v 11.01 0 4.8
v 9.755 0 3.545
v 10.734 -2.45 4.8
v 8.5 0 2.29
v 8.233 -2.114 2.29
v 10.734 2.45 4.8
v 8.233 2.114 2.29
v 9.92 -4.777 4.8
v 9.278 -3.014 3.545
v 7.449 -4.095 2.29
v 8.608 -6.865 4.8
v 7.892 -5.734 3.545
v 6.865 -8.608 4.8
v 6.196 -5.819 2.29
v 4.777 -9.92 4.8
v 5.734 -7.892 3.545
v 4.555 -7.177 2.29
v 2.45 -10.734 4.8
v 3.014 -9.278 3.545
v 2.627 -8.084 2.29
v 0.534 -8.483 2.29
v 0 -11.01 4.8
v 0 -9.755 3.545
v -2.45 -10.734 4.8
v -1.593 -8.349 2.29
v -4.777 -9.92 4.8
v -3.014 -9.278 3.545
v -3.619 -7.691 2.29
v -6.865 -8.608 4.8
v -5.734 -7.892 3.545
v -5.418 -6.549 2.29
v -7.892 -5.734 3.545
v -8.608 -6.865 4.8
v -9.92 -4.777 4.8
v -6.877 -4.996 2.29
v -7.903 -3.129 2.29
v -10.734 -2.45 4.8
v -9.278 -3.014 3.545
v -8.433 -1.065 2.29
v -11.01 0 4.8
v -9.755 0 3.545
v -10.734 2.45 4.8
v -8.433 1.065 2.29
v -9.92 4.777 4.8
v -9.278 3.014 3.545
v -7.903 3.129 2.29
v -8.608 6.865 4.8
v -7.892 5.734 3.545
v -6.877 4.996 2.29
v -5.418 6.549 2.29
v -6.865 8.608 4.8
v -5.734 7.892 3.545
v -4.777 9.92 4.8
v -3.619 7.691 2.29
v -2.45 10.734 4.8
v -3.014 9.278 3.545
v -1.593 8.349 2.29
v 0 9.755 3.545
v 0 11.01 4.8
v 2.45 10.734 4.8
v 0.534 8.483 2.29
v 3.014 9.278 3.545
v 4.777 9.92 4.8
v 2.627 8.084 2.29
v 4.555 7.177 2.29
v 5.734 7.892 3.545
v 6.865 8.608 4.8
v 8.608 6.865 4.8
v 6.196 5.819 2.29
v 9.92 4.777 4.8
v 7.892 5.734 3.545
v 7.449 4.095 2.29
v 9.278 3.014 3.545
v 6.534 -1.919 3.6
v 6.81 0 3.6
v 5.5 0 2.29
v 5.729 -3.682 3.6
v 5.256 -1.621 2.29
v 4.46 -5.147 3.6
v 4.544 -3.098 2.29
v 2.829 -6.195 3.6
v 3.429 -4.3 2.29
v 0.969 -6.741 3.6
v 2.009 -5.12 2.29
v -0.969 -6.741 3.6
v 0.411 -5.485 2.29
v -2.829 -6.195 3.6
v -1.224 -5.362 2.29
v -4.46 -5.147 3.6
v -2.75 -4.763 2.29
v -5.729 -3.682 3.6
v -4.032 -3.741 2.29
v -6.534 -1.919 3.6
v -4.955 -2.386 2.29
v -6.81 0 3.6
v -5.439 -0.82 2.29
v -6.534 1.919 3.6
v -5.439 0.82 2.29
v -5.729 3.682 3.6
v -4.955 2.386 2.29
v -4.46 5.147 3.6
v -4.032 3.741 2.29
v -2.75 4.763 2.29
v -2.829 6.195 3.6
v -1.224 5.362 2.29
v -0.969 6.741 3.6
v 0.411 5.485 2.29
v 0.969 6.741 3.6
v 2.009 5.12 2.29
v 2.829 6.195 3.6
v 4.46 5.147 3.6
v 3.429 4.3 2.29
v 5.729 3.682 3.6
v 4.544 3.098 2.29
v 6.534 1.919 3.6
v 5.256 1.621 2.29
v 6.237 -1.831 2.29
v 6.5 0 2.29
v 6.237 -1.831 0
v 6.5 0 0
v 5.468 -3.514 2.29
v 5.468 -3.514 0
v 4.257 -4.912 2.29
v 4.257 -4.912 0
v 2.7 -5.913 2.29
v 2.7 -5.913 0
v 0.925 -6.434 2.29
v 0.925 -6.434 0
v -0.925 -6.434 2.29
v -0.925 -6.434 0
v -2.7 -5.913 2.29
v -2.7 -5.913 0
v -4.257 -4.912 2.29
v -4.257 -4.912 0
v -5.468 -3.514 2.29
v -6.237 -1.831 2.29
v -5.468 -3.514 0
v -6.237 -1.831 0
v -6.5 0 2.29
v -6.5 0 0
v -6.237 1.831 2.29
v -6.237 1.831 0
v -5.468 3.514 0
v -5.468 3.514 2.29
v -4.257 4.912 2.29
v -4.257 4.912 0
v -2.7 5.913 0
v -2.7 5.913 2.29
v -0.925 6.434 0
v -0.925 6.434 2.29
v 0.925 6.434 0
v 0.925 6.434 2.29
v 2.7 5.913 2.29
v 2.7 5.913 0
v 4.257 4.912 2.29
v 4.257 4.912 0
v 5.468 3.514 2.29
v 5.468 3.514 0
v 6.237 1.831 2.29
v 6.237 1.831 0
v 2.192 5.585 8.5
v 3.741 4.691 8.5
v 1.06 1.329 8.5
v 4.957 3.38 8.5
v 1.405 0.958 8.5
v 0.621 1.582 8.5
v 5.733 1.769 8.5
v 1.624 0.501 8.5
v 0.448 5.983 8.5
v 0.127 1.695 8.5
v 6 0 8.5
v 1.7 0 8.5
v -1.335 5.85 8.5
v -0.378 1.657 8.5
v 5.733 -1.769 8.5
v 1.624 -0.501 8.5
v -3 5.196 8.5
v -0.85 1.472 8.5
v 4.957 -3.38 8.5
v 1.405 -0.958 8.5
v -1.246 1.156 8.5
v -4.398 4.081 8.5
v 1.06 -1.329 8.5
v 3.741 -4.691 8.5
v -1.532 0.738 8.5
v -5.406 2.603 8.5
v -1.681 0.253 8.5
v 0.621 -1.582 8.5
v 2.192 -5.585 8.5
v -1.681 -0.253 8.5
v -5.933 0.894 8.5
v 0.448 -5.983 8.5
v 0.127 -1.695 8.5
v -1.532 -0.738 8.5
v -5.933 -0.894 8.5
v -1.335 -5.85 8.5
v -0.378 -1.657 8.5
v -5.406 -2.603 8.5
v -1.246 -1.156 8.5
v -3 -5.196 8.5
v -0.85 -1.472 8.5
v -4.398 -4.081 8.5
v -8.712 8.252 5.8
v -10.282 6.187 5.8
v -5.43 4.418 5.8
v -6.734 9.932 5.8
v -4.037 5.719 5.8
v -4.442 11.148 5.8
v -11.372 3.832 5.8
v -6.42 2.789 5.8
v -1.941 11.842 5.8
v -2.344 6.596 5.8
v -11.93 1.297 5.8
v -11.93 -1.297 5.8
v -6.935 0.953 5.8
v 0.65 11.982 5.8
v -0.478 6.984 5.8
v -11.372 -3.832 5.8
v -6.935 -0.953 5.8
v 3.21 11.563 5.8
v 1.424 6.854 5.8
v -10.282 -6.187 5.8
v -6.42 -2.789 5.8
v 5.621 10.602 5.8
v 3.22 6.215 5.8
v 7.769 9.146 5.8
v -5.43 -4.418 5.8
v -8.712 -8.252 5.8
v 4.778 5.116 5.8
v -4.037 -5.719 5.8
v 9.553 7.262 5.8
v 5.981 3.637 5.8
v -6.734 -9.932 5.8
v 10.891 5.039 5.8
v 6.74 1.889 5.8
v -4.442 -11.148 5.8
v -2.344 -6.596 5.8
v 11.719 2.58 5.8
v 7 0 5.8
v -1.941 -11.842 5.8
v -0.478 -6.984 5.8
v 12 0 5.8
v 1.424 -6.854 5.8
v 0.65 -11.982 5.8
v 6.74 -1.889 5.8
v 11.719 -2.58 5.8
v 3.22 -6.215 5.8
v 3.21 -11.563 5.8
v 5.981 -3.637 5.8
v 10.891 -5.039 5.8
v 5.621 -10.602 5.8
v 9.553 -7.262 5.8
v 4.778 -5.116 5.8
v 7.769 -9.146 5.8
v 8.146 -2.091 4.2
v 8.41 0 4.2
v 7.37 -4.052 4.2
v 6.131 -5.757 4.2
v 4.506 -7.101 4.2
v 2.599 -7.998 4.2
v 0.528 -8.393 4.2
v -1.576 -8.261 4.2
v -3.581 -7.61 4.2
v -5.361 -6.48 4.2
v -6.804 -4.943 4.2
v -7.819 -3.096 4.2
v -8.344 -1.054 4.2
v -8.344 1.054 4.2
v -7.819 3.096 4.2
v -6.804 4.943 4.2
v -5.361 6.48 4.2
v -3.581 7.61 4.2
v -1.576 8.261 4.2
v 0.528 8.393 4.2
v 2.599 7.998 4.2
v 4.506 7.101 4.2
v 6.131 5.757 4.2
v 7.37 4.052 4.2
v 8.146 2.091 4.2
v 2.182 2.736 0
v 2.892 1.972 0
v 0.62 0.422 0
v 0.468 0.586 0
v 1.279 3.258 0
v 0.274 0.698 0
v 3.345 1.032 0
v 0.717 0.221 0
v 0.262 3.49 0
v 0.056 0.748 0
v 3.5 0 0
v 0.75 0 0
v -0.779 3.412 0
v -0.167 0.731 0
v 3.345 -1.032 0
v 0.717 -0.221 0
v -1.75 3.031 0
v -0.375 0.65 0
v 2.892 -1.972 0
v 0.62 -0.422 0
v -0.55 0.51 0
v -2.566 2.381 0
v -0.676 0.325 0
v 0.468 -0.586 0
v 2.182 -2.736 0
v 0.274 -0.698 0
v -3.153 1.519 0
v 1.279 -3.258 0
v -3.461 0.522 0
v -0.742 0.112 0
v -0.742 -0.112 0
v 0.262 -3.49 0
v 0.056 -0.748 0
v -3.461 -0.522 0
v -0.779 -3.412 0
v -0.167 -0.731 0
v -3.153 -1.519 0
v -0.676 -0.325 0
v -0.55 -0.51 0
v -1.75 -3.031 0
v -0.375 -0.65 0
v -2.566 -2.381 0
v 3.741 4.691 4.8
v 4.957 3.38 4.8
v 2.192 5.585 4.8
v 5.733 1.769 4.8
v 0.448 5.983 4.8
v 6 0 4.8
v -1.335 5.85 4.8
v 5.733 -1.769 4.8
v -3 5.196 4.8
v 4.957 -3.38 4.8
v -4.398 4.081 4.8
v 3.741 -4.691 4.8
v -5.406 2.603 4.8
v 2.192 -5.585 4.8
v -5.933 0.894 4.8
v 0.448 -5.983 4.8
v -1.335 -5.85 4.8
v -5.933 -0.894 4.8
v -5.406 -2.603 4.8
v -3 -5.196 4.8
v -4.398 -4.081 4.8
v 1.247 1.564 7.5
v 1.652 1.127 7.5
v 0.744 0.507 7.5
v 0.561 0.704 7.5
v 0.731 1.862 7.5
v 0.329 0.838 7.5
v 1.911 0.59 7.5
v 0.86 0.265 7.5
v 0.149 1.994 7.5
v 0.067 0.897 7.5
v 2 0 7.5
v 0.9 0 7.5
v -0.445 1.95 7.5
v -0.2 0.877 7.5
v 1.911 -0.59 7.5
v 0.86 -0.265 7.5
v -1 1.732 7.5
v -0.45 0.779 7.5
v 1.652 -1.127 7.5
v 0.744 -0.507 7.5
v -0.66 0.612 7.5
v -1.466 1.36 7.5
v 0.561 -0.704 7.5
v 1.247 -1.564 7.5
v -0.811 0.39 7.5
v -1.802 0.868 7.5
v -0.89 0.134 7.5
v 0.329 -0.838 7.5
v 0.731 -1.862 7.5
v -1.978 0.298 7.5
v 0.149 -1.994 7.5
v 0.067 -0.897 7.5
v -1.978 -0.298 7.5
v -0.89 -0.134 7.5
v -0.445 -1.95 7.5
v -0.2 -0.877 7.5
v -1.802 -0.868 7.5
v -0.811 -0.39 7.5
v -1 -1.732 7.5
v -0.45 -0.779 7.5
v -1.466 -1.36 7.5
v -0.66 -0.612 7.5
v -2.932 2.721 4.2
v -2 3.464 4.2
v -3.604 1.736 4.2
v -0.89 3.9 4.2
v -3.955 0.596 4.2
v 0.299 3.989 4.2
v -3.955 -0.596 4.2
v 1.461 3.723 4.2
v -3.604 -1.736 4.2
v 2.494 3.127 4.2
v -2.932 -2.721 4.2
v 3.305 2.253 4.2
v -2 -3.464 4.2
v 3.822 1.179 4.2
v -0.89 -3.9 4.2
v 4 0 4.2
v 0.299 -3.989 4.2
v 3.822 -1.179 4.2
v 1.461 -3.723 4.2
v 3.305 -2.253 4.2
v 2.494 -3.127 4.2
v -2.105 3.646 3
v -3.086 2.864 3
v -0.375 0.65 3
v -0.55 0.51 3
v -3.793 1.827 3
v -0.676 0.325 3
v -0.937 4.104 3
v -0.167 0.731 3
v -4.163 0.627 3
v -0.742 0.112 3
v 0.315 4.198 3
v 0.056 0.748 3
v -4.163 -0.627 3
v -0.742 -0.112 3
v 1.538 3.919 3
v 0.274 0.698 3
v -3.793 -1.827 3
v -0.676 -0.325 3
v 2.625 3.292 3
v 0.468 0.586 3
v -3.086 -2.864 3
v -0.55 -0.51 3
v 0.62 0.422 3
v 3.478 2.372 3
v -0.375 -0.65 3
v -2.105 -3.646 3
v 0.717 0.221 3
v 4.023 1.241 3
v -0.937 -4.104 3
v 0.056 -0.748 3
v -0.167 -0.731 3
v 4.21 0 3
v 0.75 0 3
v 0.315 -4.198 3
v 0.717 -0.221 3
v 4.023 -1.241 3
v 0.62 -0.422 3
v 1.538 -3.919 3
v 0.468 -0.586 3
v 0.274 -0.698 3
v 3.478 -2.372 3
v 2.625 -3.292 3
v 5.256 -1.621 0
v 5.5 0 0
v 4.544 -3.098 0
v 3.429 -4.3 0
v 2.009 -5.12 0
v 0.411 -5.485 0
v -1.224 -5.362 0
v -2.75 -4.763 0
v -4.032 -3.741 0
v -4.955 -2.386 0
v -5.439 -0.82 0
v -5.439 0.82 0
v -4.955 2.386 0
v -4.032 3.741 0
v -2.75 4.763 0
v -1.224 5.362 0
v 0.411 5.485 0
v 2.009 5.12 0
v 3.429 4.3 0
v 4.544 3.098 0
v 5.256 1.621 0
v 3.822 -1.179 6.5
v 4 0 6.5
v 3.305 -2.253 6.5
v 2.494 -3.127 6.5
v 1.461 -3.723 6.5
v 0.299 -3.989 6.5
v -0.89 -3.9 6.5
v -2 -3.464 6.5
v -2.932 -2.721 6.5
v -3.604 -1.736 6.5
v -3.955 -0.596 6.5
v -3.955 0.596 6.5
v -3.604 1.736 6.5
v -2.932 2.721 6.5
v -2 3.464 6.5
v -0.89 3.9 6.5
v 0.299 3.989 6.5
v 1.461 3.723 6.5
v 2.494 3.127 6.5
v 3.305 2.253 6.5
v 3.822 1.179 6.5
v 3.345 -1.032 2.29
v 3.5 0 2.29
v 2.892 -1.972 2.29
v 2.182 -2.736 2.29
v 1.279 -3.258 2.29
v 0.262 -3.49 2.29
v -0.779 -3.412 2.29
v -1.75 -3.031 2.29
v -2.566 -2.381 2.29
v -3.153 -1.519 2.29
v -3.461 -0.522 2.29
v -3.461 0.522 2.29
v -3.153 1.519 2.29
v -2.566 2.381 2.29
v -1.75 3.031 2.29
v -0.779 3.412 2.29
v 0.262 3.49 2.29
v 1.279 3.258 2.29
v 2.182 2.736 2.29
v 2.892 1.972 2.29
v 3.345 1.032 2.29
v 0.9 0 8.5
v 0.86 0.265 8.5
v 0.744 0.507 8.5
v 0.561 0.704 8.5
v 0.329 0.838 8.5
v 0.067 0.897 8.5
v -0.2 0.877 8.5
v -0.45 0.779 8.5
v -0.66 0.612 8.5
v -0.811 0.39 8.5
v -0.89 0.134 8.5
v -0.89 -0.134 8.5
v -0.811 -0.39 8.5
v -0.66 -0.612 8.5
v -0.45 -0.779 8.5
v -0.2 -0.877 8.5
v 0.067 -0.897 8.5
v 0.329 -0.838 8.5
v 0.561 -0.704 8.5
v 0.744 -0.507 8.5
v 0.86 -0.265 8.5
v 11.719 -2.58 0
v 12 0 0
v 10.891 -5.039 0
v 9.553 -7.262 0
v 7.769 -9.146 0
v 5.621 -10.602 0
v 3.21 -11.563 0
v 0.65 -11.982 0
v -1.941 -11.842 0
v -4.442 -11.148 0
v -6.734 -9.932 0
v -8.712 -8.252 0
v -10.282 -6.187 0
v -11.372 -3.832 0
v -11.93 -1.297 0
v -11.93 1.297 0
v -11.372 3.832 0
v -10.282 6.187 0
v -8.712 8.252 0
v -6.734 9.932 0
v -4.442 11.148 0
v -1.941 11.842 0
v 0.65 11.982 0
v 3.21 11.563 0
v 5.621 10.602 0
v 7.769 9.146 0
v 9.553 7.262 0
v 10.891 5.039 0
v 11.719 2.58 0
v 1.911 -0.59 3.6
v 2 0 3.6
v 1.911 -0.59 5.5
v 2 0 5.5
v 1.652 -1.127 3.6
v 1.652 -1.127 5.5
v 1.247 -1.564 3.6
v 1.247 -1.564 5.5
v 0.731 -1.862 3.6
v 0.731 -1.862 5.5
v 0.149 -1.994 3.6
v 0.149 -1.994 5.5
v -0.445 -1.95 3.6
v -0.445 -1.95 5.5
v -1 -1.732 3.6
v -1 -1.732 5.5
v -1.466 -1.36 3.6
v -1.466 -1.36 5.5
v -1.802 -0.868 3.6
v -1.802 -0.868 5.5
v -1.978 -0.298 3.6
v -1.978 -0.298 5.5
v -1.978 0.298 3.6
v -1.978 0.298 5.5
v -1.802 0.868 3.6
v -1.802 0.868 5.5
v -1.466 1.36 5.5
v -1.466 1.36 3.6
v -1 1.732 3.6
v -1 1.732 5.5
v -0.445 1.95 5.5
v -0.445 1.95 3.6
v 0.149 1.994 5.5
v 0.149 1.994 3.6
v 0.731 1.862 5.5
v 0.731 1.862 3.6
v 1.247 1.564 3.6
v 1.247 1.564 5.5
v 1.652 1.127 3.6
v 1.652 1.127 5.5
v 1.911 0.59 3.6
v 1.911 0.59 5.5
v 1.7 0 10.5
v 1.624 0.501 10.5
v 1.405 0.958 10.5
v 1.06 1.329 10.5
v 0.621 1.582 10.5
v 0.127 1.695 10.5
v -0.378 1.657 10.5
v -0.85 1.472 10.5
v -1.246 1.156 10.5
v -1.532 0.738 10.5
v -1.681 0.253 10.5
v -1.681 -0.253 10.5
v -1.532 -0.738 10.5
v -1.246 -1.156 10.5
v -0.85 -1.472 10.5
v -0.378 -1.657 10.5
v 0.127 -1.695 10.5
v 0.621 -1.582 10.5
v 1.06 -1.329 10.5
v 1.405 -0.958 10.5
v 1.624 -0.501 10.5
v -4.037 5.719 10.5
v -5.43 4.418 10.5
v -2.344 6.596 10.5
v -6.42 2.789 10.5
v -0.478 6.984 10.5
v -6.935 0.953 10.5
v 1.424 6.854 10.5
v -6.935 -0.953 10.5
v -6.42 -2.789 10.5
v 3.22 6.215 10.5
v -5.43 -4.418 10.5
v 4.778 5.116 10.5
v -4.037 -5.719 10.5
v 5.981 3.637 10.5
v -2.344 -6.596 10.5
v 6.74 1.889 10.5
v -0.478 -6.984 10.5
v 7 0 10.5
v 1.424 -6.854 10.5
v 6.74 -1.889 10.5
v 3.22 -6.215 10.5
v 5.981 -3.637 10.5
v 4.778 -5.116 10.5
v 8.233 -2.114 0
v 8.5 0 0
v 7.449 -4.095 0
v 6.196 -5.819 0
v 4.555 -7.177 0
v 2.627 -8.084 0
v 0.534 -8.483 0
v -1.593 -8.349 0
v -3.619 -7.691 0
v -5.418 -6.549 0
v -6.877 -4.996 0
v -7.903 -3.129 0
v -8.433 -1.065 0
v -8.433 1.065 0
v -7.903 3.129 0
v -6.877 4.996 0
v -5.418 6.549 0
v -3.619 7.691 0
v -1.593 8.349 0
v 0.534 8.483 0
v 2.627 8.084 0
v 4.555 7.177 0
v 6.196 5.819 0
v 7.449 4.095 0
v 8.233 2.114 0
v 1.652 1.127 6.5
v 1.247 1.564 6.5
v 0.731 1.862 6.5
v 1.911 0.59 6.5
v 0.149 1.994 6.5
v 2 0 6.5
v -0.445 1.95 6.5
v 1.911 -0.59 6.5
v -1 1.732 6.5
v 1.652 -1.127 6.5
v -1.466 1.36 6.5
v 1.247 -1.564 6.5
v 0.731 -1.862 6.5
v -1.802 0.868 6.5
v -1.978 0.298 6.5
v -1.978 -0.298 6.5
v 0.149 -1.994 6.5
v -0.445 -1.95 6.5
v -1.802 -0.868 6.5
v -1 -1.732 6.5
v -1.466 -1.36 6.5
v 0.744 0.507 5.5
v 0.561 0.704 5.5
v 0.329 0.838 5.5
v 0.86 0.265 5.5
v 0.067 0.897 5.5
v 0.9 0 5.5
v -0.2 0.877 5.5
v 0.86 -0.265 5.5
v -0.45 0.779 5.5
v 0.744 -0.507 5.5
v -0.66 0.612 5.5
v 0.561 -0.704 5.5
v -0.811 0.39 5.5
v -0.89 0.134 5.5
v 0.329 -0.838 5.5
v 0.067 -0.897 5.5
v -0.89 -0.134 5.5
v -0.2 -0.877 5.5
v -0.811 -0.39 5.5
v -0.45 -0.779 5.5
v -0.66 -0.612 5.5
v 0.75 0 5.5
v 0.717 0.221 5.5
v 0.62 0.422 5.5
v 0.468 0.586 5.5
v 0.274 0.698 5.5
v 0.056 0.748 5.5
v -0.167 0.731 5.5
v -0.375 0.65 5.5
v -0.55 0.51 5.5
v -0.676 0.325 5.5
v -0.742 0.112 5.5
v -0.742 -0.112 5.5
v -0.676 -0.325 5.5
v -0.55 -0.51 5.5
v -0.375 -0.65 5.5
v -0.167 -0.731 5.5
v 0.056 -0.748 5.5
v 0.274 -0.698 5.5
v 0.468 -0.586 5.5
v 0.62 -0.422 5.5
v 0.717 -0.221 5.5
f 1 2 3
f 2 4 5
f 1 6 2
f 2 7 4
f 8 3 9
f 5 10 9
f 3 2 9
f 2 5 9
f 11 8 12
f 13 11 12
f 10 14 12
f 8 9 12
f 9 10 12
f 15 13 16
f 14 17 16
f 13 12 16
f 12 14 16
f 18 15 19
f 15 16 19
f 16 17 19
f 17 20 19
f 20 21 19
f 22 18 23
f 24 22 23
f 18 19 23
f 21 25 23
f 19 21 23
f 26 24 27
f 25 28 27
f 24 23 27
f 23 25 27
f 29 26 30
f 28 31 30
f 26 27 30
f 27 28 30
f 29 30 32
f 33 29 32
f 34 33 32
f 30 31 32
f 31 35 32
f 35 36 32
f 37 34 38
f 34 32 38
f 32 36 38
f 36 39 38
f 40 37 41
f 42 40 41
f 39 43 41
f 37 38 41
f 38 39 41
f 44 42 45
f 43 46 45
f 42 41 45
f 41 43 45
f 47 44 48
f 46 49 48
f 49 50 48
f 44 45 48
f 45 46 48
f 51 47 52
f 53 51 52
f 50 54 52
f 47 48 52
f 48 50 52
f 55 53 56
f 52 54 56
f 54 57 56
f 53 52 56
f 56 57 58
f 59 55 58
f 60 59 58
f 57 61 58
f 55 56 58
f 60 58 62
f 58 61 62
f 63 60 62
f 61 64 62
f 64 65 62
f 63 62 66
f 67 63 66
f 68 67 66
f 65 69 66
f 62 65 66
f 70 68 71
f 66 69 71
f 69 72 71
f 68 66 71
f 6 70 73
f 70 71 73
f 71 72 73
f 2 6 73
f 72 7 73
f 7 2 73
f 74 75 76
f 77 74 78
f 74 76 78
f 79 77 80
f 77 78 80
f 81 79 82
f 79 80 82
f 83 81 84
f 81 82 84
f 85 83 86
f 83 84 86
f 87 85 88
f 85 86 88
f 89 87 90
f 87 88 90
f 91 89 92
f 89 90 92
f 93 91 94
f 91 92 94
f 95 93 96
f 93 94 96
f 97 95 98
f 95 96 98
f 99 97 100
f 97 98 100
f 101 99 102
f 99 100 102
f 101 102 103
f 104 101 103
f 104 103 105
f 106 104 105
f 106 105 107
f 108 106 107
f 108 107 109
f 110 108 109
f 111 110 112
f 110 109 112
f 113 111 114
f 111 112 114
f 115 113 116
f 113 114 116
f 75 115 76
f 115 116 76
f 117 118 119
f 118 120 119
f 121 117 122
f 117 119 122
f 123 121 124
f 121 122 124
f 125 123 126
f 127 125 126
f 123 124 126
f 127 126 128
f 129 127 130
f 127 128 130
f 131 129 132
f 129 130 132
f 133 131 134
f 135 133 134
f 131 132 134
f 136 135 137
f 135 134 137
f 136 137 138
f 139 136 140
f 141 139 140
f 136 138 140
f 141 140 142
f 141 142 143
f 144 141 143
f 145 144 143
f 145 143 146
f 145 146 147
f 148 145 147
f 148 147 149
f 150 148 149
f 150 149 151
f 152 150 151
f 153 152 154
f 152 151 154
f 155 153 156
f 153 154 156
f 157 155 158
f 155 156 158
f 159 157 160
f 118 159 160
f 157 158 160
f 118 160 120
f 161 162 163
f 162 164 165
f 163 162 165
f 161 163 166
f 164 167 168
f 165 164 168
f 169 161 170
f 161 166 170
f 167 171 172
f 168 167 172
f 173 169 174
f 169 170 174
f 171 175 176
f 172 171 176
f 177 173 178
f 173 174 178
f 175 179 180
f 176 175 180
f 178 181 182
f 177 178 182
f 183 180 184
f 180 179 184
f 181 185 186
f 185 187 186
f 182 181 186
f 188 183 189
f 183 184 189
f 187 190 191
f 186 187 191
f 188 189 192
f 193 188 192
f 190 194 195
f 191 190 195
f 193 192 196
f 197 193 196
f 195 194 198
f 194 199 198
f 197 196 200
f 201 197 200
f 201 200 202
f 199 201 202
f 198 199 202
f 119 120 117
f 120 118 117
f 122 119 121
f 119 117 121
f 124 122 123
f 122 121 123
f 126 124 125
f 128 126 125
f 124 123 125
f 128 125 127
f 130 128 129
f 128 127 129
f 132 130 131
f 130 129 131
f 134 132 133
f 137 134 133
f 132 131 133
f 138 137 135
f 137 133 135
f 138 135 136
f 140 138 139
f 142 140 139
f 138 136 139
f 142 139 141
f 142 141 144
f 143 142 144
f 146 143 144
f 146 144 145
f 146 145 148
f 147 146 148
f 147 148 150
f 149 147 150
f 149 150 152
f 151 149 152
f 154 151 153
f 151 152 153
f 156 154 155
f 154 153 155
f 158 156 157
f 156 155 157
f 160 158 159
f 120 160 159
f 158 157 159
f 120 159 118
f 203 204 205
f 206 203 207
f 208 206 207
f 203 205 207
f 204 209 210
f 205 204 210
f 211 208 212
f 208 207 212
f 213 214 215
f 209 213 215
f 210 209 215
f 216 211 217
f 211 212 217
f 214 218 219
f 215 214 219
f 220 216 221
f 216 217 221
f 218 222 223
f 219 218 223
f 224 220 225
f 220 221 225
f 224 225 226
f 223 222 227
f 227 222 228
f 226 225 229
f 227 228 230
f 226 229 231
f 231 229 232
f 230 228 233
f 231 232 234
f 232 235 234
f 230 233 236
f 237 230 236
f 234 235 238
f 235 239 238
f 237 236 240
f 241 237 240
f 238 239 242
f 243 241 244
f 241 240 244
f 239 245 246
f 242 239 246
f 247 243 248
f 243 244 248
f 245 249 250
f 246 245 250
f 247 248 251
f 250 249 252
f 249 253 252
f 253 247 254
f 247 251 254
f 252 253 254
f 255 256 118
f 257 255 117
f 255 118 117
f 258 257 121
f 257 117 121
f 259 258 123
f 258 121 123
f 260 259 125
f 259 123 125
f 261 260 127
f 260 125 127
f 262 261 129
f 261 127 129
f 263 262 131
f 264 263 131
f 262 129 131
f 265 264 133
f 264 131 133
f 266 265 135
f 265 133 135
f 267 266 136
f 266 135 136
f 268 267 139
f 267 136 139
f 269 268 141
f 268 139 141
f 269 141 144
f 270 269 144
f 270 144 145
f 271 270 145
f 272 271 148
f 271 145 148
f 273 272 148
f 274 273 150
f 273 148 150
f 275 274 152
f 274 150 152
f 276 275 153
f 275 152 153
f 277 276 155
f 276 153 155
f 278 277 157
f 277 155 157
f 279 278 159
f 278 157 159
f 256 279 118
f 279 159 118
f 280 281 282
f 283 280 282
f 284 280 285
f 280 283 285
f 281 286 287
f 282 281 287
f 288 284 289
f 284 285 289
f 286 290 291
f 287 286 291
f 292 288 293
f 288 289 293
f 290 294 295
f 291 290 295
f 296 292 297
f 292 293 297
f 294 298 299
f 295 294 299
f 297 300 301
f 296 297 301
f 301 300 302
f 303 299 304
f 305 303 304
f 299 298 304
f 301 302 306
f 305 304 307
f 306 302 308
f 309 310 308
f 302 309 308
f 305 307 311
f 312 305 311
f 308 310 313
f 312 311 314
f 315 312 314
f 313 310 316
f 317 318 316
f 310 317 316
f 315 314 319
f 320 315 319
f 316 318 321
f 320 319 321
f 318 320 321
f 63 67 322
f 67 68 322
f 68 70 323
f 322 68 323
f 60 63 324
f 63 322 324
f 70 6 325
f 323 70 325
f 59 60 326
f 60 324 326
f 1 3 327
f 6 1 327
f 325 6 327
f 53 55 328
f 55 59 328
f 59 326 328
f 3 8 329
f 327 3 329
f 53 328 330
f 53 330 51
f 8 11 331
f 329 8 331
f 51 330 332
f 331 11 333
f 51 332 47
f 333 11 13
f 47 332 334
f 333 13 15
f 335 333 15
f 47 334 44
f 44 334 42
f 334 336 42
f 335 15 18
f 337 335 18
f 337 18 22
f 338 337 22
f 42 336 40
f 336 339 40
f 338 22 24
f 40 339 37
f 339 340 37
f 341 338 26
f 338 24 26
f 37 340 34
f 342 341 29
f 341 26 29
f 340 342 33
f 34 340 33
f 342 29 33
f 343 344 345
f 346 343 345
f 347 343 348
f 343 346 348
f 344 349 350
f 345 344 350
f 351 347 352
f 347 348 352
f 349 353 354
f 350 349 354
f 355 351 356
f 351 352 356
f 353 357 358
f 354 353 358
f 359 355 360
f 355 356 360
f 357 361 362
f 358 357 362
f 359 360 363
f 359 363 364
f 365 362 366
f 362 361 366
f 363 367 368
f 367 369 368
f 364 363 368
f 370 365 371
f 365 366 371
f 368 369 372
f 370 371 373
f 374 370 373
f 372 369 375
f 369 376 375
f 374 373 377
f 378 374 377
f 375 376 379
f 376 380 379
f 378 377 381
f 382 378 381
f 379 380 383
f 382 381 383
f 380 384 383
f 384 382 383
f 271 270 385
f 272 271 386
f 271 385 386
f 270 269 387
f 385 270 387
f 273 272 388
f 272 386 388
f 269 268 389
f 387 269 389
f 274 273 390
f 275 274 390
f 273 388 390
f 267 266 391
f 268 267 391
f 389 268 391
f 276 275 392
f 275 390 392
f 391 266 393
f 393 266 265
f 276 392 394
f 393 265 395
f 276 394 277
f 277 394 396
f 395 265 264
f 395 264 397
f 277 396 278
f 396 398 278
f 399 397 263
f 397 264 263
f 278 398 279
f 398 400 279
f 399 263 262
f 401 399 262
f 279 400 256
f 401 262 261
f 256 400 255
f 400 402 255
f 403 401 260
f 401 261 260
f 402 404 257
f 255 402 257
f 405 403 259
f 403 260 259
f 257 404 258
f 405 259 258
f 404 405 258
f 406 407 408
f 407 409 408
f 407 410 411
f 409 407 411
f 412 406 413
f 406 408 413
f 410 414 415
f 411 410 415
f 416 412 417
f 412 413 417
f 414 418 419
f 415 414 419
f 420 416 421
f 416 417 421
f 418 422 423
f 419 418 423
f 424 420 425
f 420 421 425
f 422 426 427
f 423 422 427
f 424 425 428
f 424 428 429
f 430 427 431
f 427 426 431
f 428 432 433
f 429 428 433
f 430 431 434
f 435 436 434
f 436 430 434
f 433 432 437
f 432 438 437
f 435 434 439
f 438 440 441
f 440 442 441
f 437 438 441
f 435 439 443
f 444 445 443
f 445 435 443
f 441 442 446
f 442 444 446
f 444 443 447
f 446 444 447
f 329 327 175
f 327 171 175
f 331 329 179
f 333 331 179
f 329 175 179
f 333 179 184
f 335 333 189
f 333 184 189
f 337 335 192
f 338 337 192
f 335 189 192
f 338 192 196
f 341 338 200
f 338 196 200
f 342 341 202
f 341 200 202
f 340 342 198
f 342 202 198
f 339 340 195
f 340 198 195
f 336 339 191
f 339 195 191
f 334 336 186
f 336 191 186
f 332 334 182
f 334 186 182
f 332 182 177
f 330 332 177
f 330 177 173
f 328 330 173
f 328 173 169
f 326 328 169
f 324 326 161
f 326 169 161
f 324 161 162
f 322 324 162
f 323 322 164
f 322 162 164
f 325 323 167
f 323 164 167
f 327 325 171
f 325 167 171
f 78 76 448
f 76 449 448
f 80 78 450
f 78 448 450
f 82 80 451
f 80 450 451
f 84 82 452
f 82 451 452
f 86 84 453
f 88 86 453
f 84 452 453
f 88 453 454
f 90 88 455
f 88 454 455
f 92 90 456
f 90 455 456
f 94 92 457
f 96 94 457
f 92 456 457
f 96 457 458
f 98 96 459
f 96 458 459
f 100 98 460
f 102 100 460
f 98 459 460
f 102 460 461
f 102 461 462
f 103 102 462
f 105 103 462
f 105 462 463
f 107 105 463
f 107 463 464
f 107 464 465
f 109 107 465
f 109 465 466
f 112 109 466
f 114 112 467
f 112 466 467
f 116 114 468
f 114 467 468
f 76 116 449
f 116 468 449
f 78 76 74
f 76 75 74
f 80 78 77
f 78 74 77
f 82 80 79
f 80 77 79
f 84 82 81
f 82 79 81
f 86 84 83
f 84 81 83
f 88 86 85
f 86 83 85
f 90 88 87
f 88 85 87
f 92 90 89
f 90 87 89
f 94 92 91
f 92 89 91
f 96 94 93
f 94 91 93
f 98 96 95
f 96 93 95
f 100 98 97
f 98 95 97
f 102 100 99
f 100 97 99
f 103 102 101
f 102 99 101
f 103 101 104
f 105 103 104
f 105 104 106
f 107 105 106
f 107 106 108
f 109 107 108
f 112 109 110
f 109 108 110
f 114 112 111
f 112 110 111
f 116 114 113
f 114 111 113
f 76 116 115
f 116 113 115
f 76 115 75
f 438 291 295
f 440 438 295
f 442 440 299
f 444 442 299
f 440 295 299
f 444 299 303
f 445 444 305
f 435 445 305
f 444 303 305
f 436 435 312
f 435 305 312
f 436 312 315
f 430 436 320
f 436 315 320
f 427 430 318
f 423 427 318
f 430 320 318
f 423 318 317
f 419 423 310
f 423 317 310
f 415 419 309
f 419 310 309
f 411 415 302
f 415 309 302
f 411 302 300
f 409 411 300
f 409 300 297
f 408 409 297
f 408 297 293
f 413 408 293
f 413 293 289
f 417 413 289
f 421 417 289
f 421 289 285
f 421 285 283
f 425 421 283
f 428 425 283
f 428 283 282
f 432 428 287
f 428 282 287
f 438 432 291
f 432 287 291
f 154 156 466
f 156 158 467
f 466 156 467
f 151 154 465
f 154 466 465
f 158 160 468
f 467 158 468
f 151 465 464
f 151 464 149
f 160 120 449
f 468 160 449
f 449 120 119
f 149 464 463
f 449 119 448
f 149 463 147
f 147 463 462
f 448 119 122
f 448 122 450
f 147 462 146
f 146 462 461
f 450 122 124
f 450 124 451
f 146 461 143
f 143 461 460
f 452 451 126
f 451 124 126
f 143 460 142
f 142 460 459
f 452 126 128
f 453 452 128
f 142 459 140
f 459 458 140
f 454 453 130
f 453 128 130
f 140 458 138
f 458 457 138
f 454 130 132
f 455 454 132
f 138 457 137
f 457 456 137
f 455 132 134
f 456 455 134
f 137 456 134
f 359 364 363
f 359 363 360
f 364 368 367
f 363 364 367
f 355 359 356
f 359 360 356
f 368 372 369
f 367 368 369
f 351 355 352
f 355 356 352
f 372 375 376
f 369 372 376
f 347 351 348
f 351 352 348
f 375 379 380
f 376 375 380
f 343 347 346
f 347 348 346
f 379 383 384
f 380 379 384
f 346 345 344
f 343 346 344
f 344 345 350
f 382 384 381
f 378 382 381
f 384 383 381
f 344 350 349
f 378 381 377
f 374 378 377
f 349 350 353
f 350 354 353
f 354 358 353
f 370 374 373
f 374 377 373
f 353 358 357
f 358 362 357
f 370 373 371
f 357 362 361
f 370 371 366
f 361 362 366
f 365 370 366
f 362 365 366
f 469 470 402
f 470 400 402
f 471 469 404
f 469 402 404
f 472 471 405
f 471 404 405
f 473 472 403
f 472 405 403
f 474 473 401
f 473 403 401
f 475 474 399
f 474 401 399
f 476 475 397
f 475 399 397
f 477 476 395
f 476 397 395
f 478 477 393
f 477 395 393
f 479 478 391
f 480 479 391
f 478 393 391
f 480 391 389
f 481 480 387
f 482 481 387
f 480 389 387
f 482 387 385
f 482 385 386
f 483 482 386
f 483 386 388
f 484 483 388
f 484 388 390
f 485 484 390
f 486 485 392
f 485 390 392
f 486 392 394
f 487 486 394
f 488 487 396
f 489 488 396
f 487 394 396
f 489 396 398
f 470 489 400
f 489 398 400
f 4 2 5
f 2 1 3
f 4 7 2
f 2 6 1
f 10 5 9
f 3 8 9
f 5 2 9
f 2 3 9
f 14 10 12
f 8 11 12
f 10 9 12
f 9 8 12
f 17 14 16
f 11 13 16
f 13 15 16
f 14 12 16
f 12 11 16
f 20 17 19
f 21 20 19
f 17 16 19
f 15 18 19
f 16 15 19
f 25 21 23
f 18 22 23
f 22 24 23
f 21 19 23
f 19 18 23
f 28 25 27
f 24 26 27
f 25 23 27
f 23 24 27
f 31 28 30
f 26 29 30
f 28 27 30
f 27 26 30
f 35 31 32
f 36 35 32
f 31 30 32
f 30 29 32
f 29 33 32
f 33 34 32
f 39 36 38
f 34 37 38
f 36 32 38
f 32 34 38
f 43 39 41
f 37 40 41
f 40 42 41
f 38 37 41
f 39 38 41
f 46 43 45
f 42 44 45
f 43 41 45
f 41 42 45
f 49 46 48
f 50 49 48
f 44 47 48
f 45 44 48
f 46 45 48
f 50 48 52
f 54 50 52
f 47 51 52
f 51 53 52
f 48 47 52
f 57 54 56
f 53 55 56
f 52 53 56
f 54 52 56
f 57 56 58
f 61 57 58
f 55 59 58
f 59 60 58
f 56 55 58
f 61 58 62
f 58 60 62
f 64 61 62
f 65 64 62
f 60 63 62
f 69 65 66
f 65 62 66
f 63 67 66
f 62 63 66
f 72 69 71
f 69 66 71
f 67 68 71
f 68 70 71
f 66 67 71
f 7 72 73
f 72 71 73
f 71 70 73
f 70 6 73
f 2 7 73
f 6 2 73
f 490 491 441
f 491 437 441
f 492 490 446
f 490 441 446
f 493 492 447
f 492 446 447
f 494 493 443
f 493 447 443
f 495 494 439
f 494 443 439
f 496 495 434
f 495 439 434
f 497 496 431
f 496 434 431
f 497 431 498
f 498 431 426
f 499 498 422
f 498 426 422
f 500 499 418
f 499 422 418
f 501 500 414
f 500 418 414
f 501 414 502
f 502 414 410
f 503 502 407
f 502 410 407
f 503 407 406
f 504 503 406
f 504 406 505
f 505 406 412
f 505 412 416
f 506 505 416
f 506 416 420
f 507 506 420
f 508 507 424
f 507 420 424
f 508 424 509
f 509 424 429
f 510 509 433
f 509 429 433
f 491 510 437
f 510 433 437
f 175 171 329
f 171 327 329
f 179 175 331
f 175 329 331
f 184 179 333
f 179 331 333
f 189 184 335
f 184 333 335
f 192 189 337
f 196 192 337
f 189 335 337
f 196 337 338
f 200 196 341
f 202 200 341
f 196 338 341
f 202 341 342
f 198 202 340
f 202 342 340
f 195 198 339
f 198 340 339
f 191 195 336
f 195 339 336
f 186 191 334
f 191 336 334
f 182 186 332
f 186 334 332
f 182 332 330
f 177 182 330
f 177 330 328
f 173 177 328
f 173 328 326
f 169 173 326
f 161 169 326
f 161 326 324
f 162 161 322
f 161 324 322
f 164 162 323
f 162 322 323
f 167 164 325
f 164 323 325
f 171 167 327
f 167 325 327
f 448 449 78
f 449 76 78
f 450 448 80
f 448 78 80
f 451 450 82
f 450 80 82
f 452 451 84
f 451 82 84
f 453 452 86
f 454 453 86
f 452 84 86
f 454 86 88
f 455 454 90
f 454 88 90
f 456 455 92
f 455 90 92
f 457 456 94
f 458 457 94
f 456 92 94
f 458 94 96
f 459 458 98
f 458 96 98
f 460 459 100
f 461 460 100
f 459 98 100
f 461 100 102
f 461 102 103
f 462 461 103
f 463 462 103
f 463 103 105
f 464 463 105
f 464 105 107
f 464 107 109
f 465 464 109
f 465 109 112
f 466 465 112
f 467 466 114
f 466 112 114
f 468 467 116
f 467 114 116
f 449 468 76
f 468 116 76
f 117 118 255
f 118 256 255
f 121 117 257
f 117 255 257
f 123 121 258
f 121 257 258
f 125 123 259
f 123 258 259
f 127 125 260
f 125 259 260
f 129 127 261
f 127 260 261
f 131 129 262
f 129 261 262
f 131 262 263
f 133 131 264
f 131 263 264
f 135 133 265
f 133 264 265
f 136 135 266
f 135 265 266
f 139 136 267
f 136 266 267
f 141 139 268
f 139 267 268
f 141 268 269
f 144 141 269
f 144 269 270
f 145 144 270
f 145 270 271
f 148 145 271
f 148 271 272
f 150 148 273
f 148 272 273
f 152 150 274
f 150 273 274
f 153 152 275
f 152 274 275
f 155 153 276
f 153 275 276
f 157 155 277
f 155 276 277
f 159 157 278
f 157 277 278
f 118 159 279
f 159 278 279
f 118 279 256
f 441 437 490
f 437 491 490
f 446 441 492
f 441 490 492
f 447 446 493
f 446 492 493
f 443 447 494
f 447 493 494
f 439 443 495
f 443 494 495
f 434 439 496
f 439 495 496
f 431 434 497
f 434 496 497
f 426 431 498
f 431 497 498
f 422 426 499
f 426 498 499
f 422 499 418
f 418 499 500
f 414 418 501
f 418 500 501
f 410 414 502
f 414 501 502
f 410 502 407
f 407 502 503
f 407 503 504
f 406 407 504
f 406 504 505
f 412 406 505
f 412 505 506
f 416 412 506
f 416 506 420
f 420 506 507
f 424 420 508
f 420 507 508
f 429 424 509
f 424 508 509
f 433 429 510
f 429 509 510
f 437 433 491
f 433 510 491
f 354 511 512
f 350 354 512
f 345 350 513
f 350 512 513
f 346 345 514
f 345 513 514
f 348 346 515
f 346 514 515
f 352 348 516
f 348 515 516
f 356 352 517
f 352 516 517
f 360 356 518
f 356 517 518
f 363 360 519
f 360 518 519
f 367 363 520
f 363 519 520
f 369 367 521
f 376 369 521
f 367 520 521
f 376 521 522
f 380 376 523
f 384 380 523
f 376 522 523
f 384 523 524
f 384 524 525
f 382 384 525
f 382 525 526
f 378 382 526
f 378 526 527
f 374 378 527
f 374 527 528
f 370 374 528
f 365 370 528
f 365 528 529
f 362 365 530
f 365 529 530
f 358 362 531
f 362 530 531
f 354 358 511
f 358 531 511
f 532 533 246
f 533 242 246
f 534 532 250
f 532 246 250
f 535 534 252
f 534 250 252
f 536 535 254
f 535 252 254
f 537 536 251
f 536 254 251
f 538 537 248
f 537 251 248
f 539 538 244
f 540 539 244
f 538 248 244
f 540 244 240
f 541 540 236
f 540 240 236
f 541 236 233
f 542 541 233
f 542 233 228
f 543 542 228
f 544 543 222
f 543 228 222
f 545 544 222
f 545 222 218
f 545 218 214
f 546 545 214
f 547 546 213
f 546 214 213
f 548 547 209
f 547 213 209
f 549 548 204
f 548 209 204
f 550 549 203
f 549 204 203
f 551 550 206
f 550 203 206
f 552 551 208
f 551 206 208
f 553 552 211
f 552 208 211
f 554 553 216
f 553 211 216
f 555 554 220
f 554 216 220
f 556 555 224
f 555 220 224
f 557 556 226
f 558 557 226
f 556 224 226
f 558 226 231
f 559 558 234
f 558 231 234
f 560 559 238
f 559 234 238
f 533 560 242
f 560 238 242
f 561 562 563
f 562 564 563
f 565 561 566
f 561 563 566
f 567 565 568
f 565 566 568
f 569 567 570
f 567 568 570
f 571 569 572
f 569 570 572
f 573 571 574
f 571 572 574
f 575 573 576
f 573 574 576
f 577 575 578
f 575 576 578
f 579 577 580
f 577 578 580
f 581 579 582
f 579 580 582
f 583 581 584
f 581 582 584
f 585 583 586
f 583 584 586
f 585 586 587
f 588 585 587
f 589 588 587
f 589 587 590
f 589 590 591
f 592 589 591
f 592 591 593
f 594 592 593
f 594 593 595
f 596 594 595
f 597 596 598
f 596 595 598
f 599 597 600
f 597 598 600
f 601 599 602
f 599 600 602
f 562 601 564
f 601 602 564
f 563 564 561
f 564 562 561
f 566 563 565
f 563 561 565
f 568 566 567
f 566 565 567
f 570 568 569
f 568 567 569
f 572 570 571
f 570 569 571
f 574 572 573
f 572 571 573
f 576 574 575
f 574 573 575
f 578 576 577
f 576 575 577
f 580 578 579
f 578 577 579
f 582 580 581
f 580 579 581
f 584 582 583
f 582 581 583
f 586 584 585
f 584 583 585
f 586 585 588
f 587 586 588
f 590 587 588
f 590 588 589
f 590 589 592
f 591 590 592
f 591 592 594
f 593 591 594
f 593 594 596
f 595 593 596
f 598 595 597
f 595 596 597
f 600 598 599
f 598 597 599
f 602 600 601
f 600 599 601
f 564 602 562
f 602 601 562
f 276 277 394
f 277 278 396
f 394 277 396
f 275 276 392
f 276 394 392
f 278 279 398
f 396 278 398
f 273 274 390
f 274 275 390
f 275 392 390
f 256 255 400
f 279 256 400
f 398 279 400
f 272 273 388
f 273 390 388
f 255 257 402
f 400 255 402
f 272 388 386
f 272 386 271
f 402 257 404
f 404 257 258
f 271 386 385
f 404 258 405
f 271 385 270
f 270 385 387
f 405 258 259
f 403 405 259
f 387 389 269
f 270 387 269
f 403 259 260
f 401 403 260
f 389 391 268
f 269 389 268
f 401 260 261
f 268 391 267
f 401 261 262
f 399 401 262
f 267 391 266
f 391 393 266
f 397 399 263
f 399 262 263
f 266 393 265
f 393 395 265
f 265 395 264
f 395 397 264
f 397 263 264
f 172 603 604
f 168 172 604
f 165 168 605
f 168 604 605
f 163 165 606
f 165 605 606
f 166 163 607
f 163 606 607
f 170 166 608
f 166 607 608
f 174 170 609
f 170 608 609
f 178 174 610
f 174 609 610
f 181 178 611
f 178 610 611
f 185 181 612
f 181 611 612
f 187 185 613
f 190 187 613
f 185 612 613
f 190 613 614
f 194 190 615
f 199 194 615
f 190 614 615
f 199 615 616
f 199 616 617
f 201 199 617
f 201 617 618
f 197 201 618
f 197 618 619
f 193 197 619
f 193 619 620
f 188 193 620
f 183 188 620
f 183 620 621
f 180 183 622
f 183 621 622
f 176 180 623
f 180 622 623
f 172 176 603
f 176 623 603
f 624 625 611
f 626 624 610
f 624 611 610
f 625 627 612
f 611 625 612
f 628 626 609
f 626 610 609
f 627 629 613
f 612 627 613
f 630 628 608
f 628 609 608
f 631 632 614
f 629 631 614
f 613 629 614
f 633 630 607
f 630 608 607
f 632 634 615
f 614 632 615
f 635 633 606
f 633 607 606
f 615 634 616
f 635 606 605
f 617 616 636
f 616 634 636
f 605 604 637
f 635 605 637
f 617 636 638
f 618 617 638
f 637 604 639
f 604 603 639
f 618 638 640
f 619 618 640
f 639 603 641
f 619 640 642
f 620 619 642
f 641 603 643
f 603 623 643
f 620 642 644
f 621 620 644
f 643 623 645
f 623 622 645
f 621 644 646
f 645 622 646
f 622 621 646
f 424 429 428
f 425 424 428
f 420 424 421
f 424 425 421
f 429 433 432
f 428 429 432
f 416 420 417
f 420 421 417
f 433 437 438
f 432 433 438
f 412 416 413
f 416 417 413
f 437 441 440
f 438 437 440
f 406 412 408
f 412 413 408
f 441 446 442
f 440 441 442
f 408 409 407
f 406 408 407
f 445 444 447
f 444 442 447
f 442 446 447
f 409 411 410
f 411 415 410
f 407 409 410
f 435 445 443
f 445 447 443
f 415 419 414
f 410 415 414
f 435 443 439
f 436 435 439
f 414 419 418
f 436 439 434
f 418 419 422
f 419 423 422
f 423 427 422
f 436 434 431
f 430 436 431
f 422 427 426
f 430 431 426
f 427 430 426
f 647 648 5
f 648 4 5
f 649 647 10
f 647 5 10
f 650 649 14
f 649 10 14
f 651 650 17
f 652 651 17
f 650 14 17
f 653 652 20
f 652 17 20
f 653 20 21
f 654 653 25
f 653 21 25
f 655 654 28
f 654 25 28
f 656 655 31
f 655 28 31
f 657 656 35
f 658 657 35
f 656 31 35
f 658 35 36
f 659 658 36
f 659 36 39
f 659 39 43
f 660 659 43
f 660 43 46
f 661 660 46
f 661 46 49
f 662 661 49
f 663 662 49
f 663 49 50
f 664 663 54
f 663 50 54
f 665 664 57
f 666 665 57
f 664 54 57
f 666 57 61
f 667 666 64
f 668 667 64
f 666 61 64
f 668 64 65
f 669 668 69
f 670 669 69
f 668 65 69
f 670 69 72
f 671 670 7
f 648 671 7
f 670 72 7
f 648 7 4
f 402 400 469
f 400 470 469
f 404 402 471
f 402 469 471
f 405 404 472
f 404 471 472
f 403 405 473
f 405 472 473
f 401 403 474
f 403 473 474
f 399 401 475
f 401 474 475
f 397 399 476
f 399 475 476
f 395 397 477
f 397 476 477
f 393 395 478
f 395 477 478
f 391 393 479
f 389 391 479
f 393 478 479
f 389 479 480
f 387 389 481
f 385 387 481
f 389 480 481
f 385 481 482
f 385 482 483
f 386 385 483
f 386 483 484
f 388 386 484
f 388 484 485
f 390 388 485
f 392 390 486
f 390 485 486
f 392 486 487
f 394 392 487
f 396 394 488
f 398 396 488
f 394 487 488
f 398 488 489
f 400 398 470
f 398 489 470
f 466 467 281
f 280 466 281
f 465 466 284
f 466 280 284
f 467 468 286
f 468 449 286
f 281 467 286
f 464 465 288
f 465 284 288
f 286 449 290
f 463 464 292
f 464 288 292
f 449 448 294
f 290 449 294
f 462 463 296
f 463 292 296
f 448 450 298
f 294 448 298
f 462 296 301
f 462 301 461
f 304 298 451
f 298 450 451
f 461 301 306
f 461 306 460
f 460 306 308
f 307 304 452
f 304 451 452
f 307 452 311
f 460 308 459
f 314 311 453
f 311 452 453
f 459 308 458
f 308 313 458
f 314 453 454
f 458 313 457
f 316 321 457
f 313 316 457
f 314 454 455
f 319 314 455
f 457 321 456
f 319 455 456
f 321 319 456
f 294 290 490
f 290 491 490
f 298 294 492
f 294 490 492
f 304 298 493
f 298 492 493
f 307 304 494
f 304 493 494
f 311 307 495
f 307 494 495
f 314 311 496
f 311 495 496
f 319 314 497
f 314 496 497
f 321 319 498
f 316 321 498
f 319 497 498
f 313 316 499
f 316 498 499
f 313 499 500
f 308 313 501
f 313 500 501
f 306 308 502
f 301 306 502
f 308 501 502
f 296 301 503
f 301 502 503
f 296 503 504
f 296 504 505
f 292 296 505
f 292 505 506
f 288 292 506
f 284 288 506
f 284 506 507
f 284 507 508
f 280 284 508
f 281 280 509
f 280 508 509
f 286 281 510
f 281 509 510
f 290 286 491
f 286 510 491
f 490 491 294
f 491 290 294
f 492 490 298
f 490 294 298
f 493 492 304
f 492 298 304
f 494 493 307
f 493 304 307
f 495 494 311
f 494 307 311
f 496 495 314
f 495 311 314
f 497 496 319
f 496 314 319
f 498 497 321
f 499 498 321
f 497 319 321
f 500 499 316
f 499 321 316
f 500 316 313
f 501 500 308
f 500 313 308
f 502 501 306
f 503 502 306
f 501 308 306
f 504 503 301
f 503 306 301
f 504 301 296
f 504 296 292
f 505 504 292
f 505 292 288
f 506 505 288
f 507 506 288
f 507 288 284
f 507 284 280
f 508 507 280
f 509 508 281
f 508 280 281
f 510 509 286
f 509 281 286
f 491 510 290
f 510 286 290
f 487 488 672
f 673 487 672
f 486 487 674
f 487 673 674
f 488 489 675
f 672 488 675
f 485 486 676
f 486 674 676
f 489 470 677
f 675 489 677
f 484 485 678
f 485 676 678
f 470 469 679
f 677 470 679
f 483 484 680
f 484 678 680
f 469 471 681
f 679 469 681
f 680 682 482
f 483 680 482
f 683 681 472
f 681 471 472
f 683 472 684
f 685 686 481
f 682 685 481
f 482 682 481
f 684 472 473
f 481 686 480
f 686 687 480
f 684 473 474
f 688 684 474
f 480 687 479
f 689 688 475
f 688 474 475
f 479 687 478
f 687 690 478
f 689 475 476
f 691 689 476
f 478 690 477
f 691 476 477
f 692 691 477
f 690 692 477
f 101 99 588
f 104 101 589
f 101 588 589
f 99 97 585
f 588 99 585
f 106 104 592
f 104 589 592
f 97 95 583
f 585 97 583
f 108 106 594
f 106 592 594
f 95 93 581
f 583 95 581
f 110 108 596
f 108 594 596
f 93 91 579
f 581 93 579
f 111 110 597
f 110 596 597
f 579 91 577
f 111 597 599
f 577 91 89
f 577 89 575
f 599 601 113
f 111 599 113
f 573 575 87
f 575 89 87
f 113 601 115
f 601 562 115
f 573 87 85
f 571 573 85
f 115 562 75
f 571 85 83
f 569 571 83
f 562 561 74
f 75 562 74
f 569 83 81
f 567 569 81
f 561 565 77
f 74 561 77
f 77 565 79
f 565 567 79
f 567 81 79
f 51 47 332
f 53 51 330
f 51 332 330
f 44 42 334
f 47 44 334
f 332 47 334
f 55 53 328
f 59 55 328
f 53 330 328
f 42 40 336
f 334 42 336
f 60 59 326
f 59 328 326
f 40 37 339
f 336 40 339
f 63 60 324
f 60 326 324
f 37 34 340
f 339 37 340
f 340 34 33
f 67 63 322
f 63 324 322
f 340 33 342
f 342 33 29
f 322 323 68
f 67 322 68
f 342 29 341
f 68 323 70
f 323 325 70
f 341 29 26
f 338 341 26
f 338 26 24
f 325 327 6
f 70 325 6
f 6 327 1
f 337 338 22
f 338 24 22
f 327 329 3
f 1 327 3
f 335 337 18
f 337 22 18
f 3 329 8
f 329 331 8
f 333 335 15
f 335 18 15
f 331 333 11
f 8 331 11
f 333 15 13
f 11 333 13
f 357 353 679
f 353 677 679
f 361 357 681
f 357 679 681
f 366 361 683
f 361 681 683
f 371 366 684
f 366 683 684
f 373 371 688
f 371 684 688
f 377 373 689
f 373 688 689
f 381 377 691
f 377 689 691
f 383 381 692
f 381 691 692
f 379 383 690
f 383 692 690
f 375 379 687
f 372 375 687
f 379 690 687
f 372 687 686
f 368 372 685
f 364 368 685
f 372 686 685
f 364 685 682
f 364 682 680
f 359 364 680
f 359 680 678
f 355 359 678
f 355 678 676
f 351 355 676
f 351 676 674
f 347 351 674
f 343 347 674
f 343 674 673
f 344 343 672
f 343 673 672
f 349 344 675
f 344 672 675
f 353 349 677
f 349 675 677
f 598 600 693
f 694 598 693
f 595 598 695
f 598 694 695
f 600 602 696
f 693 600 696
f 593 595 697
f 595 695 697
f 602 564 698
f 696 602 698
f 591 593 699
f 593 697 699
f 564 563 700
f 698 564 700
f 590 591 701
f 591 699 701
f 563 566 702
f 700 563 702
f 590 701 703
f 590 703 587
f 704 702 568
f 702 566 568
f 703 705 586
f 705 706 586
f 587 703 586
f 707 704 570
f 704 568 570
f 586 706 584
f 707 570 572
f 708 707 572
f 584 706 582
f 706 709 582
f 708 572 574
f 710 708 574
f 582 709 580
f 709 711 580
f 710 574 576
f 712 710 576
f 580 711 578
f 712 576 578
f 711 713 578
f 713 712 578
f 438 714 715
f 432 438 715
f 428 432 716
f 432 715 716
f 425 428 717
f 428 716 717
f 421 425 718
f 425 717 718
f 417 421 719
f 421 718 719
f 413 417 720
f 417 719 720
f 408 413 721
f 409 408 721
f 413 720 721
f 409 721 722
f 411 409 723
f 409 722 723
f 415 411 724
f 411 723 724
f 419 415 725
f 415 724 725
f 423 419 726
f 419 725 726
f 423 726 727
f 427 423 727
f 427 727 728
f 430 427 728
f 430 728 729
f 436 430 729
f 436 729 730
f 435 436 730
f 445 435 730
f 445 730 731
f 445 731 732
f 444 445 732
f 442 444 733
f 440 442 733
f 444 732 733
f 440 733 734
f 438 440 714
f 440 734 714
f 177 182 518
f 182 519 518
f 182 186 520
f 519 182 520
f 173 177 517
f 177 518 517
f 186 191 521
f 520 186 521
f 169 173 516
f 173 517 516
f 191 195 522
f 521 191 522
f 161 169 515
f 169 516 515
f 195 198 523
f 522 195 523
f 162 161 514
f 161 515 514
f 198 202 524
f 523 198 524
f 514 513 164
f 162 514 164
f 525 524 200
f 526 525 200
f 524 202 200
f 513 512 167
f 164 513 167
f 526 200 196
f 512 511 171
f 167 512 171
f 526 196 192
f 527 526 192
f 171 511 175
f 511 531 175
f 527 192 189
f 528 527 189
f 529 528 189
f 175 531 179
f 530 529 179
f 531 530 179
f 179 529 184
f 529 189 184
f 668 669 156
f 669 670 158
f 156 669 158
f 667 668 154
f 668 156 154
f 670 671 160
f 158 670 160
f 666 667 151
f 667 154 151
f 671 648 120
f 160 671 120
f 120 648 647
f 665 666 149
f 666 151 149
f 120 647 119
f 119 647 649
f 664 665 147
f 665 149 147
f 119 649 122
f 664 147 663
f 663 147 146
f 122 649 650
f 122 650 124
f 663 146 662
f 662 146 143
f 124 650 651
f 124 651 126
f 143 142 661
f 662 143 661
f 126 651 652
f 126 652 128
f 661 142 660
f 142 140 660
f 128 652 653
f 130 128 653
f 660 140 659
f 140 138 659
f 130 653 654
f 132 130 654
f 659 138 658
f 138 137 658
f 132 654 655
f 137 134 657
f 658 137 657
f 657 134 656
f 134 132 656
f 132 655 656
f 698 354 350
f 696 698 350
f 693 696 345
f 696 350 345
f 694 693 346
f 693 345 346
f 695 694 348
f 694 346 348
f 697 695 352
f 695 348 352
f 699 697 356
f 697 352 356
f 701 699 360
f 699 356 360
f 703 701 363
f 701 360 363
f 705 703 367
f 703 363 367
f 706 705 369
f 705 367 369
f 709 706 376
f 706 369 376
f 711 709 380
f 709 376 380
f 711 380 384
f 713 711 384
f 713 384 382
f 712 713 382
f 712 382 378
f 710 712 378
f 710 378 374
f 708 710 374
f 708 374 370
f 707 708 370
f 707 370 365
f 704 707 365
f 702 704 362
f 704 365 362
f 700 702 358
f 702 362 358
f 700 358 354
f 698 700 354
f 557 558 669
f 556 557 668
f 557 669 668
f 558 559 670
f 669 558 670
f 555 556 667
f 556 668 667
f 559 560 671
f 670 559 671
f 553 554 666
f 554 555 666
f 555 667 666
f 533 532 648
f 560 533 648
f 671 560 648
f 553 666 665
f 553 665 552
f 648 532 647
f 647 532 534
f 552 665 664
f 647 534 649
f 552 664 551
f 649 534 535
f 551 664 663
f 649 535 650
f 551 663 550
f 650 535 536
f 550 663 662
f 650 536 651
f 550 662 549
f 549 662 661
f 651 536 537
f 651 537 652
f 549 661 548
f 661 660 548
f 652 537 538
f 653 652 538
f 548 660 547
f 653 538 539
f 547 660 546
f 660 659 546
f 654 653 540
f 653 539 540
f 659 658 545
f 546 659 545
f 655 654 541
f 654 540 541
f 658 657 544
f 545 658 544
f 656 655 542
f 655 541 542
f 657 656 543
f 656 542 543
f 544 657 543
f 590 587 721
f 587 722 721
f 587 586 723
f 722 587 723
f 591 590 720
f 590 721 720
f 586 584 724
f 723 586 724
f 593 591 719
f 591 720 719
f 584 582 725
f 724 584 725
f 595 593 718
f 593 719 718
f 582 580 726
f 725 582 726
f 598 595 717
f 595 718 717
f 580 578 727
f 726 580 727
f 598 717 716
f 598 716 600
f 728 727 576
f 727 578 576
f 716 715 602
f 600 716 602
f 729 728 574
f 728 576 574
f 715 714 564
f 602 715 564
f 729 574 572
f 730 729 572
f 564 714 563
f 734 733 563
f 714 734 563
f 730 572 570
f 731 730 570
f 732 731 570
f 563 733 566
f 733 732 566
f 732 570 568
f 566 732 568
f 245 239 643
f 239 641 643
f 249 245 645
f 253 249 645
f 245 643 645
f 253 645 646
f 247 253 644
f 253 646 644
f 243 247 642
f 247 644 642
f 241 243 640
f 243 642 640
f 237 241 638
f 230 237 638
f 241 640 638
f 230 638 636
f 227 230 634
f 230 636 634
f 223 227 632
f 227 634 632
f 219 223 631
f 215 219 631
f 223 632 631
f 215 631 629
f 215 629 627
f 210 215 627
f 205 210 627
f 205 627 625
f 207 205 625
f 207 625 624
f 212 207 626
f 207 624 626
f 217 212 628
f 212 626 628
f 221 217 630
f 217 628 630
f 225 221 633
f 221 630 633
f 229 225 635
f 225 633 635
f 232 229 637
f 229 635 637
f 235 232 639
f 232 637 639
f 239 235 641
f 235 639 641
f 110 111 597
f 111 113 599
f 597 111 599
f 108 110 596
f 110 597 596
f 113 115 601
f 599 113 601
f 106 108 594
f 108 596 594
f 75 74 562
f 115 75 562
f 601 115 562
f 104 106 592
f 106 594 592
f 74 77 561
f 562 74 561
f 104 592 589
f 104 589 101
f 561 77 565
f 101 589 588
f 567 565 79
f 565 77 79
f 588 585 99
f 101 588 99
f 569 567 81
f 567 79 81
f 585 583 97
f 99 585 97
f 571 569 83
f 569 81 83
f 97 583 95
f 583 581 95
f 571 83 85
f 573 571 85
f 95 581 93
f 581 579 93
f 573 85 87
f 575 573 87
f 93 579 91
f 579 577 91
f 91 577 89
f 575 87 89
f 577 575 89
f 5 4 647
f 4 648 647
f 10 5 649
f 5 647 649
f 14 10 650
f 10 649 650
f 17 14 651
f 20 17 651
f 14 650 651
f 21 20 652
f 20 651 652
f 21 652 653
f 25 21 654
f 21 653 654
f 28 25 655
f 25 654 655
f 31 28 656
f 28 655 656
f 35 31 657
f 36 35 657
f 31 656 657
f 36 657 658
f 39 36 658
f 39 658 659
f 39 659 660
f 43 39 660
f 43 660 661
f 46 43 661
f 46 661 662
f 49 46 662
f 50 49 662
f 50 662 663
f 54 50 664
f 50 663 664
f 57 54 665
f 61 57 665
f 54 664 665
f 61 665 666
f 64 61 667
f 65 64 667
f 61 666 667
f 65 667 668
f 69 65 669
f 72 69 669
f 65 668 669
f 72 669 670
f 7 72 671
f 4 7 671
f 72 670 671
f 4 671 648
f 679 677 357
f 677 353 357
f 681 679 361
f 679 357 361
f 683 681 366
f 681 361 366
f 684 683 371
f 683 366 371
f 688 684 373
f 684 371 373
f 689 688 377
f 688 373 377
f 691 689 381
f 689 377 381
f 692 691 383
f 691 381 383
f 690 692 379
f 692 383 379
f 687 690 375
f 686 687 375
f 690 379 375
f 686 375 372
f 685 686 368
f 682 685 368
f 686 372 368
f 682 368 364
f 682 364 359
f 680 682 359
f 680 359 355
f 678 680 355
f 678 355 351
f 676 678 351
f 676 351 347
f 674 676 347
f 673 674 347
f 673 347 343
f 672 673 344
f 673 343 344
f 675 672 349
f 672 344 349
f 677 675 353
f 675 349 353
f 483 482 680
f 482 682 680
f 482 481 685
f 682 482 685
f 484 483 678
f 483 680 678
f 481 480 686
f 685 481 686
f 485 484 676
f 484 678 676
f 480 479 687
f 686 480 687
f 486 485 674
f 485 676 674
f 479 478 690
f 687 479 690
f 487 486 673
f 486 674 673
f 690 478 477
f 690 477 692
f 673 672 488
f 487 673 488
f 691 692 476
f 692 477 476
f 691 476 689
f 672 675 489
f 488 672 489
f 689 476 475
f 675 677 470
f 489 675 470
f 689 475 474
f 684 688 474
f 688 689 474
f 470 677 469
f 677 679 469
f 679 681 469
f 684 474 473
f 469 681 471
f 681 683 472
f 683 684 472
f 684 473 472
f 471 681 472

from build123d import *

# Parameters (mm, degrees)
F2_R      = 0.75
F3_DEPTH  = 3
F5_R      = 0.75
F6_DEPTH  = 2.5
F8_R      = 0.9
F9_DEPTH  = 2
F11_R     = 0.9
F12_DEPTH = 1
F14_R     = 1.7
F15_DEPTH = 2


with BuildPart() as f1:
    # F0 (on Front) → F1 (revolve)
    with BuildSketch(Plane.XZ):
        Polygon((0, 3), (0, 0), (3.5, 0), (3.5, 2.29), (4.21, 3), align=None)
    revolve(axis=Axis((0, 0, 1.5), (0, 0, -1)))

    # F2 (on face) → F3 (cut, through all)
    with BuildSketch(Plane(origin=(0, 0, 0), x_dir=(1, 0, 0), z_dir=(0, 0, -1))):
        Circle(F2_R)
    extrude(amount=-F3_DEPTH, mode=Mode.SUBTRACT)


with BuildPart() as f4:
    # F0 (on Front) → F4 (revolve)
    with BuildSketch(Plane.XZ):
        Polygon((3.5, 2.29), (3.5, 0), (5.5, 0), (5.5, 2.29), (6.81, 3.6), (2, 3.6), (2, 5.5), (0, 5.5), (0, 3), (4.21, 3), align=None)
    revolve(axis=Axis((0, 0, 2.75), (0, 0, -1)))

    # F5 (on face) → F6 (cut, through all)
    with BuildSketch(Plane.XY.offset(5.5)):
        Circle(F5_R)
    extrude(amount=-F6_DEPTH, mode=Mode.SUBTRACT)


with BuildPart() as f7:
    # F0 (on Front) → F7 (revolve)
    with BuildSketch(Plane.XZ):
        Polygon((5.5, 2.29), (5.5, 0), (6.5, 0), (6.5, 2.29), (8.41, 4.2), (4, 4.2), (4, 6.5), (2, 6.5), (2, 7.5), (0, 7.5), (0, 5.5), (2, 5.5), (2, 3.6), (6.81, 3.6), align=None)
    revolve(axis=Axis((0, 0, 3.75), (0, 0, -1)))

    # F8 (on face) → F9 (cut, through all)
    with BuildSketch(Plane.XY.offset(7.5)):
        Circle(F8_R)
    extrude(amount=-F9_DEPTH, mode=Mode.SUBTRACT)


with BuildPart() as f10:
    # F0 (on Front) → F10 (revolve)
    with BuildSketch(Plane.XZ):
        Polygon((6.5, 2.29), (6.5, 0), (8.5, 0), (8.5, 2.29), (11.01, 4.8), (6, 4.8), (6, 8.5), (0, 8.5), (0, 7.5), (2, 7.5), (2, 6.5), (4, 6.5), (4, 4.2), (8.41, 4.2), align=None)
    revolve(axis=Axis((0, 0, 4.25), (0, 0, -1)))

    # F11 (on face) → F12 (cut, through all)
    with BuildSketch(Plane.XY.offset(8.5)):
        Circle(F11_R)
    extrude(amount=-F12_DEPTH, mode=Mode.SUBTRACT)


with BuildPart() as f13:
    # F0 (on Front) → F13 (revolve)
    with BuildSketch(Plane.XZ):
        Polygon((8.5, 2.29), (8.5, 0), (12, 0), (12, 5.8), (7, 5.8), (7, 10.5), (0, 10.5), (0, 8.5), (6, 8.5), (6, 4.8), (11.01, 4.8), align=None)
    revolve(axis=Axis((0, 0, 5.25), (0, 0, -1)))

    # F14 (on face) → F15 (cut, through all)
    with BuildSketch(Plane.XY.offset(10.5)):
        Circle(F14_R)
    extrude(amount=-F15_DEPTH, mode=Mode.SUBTRACT)


solid = Compound([f1.part, f4.part, f7.part, f10.part, f13.part])
